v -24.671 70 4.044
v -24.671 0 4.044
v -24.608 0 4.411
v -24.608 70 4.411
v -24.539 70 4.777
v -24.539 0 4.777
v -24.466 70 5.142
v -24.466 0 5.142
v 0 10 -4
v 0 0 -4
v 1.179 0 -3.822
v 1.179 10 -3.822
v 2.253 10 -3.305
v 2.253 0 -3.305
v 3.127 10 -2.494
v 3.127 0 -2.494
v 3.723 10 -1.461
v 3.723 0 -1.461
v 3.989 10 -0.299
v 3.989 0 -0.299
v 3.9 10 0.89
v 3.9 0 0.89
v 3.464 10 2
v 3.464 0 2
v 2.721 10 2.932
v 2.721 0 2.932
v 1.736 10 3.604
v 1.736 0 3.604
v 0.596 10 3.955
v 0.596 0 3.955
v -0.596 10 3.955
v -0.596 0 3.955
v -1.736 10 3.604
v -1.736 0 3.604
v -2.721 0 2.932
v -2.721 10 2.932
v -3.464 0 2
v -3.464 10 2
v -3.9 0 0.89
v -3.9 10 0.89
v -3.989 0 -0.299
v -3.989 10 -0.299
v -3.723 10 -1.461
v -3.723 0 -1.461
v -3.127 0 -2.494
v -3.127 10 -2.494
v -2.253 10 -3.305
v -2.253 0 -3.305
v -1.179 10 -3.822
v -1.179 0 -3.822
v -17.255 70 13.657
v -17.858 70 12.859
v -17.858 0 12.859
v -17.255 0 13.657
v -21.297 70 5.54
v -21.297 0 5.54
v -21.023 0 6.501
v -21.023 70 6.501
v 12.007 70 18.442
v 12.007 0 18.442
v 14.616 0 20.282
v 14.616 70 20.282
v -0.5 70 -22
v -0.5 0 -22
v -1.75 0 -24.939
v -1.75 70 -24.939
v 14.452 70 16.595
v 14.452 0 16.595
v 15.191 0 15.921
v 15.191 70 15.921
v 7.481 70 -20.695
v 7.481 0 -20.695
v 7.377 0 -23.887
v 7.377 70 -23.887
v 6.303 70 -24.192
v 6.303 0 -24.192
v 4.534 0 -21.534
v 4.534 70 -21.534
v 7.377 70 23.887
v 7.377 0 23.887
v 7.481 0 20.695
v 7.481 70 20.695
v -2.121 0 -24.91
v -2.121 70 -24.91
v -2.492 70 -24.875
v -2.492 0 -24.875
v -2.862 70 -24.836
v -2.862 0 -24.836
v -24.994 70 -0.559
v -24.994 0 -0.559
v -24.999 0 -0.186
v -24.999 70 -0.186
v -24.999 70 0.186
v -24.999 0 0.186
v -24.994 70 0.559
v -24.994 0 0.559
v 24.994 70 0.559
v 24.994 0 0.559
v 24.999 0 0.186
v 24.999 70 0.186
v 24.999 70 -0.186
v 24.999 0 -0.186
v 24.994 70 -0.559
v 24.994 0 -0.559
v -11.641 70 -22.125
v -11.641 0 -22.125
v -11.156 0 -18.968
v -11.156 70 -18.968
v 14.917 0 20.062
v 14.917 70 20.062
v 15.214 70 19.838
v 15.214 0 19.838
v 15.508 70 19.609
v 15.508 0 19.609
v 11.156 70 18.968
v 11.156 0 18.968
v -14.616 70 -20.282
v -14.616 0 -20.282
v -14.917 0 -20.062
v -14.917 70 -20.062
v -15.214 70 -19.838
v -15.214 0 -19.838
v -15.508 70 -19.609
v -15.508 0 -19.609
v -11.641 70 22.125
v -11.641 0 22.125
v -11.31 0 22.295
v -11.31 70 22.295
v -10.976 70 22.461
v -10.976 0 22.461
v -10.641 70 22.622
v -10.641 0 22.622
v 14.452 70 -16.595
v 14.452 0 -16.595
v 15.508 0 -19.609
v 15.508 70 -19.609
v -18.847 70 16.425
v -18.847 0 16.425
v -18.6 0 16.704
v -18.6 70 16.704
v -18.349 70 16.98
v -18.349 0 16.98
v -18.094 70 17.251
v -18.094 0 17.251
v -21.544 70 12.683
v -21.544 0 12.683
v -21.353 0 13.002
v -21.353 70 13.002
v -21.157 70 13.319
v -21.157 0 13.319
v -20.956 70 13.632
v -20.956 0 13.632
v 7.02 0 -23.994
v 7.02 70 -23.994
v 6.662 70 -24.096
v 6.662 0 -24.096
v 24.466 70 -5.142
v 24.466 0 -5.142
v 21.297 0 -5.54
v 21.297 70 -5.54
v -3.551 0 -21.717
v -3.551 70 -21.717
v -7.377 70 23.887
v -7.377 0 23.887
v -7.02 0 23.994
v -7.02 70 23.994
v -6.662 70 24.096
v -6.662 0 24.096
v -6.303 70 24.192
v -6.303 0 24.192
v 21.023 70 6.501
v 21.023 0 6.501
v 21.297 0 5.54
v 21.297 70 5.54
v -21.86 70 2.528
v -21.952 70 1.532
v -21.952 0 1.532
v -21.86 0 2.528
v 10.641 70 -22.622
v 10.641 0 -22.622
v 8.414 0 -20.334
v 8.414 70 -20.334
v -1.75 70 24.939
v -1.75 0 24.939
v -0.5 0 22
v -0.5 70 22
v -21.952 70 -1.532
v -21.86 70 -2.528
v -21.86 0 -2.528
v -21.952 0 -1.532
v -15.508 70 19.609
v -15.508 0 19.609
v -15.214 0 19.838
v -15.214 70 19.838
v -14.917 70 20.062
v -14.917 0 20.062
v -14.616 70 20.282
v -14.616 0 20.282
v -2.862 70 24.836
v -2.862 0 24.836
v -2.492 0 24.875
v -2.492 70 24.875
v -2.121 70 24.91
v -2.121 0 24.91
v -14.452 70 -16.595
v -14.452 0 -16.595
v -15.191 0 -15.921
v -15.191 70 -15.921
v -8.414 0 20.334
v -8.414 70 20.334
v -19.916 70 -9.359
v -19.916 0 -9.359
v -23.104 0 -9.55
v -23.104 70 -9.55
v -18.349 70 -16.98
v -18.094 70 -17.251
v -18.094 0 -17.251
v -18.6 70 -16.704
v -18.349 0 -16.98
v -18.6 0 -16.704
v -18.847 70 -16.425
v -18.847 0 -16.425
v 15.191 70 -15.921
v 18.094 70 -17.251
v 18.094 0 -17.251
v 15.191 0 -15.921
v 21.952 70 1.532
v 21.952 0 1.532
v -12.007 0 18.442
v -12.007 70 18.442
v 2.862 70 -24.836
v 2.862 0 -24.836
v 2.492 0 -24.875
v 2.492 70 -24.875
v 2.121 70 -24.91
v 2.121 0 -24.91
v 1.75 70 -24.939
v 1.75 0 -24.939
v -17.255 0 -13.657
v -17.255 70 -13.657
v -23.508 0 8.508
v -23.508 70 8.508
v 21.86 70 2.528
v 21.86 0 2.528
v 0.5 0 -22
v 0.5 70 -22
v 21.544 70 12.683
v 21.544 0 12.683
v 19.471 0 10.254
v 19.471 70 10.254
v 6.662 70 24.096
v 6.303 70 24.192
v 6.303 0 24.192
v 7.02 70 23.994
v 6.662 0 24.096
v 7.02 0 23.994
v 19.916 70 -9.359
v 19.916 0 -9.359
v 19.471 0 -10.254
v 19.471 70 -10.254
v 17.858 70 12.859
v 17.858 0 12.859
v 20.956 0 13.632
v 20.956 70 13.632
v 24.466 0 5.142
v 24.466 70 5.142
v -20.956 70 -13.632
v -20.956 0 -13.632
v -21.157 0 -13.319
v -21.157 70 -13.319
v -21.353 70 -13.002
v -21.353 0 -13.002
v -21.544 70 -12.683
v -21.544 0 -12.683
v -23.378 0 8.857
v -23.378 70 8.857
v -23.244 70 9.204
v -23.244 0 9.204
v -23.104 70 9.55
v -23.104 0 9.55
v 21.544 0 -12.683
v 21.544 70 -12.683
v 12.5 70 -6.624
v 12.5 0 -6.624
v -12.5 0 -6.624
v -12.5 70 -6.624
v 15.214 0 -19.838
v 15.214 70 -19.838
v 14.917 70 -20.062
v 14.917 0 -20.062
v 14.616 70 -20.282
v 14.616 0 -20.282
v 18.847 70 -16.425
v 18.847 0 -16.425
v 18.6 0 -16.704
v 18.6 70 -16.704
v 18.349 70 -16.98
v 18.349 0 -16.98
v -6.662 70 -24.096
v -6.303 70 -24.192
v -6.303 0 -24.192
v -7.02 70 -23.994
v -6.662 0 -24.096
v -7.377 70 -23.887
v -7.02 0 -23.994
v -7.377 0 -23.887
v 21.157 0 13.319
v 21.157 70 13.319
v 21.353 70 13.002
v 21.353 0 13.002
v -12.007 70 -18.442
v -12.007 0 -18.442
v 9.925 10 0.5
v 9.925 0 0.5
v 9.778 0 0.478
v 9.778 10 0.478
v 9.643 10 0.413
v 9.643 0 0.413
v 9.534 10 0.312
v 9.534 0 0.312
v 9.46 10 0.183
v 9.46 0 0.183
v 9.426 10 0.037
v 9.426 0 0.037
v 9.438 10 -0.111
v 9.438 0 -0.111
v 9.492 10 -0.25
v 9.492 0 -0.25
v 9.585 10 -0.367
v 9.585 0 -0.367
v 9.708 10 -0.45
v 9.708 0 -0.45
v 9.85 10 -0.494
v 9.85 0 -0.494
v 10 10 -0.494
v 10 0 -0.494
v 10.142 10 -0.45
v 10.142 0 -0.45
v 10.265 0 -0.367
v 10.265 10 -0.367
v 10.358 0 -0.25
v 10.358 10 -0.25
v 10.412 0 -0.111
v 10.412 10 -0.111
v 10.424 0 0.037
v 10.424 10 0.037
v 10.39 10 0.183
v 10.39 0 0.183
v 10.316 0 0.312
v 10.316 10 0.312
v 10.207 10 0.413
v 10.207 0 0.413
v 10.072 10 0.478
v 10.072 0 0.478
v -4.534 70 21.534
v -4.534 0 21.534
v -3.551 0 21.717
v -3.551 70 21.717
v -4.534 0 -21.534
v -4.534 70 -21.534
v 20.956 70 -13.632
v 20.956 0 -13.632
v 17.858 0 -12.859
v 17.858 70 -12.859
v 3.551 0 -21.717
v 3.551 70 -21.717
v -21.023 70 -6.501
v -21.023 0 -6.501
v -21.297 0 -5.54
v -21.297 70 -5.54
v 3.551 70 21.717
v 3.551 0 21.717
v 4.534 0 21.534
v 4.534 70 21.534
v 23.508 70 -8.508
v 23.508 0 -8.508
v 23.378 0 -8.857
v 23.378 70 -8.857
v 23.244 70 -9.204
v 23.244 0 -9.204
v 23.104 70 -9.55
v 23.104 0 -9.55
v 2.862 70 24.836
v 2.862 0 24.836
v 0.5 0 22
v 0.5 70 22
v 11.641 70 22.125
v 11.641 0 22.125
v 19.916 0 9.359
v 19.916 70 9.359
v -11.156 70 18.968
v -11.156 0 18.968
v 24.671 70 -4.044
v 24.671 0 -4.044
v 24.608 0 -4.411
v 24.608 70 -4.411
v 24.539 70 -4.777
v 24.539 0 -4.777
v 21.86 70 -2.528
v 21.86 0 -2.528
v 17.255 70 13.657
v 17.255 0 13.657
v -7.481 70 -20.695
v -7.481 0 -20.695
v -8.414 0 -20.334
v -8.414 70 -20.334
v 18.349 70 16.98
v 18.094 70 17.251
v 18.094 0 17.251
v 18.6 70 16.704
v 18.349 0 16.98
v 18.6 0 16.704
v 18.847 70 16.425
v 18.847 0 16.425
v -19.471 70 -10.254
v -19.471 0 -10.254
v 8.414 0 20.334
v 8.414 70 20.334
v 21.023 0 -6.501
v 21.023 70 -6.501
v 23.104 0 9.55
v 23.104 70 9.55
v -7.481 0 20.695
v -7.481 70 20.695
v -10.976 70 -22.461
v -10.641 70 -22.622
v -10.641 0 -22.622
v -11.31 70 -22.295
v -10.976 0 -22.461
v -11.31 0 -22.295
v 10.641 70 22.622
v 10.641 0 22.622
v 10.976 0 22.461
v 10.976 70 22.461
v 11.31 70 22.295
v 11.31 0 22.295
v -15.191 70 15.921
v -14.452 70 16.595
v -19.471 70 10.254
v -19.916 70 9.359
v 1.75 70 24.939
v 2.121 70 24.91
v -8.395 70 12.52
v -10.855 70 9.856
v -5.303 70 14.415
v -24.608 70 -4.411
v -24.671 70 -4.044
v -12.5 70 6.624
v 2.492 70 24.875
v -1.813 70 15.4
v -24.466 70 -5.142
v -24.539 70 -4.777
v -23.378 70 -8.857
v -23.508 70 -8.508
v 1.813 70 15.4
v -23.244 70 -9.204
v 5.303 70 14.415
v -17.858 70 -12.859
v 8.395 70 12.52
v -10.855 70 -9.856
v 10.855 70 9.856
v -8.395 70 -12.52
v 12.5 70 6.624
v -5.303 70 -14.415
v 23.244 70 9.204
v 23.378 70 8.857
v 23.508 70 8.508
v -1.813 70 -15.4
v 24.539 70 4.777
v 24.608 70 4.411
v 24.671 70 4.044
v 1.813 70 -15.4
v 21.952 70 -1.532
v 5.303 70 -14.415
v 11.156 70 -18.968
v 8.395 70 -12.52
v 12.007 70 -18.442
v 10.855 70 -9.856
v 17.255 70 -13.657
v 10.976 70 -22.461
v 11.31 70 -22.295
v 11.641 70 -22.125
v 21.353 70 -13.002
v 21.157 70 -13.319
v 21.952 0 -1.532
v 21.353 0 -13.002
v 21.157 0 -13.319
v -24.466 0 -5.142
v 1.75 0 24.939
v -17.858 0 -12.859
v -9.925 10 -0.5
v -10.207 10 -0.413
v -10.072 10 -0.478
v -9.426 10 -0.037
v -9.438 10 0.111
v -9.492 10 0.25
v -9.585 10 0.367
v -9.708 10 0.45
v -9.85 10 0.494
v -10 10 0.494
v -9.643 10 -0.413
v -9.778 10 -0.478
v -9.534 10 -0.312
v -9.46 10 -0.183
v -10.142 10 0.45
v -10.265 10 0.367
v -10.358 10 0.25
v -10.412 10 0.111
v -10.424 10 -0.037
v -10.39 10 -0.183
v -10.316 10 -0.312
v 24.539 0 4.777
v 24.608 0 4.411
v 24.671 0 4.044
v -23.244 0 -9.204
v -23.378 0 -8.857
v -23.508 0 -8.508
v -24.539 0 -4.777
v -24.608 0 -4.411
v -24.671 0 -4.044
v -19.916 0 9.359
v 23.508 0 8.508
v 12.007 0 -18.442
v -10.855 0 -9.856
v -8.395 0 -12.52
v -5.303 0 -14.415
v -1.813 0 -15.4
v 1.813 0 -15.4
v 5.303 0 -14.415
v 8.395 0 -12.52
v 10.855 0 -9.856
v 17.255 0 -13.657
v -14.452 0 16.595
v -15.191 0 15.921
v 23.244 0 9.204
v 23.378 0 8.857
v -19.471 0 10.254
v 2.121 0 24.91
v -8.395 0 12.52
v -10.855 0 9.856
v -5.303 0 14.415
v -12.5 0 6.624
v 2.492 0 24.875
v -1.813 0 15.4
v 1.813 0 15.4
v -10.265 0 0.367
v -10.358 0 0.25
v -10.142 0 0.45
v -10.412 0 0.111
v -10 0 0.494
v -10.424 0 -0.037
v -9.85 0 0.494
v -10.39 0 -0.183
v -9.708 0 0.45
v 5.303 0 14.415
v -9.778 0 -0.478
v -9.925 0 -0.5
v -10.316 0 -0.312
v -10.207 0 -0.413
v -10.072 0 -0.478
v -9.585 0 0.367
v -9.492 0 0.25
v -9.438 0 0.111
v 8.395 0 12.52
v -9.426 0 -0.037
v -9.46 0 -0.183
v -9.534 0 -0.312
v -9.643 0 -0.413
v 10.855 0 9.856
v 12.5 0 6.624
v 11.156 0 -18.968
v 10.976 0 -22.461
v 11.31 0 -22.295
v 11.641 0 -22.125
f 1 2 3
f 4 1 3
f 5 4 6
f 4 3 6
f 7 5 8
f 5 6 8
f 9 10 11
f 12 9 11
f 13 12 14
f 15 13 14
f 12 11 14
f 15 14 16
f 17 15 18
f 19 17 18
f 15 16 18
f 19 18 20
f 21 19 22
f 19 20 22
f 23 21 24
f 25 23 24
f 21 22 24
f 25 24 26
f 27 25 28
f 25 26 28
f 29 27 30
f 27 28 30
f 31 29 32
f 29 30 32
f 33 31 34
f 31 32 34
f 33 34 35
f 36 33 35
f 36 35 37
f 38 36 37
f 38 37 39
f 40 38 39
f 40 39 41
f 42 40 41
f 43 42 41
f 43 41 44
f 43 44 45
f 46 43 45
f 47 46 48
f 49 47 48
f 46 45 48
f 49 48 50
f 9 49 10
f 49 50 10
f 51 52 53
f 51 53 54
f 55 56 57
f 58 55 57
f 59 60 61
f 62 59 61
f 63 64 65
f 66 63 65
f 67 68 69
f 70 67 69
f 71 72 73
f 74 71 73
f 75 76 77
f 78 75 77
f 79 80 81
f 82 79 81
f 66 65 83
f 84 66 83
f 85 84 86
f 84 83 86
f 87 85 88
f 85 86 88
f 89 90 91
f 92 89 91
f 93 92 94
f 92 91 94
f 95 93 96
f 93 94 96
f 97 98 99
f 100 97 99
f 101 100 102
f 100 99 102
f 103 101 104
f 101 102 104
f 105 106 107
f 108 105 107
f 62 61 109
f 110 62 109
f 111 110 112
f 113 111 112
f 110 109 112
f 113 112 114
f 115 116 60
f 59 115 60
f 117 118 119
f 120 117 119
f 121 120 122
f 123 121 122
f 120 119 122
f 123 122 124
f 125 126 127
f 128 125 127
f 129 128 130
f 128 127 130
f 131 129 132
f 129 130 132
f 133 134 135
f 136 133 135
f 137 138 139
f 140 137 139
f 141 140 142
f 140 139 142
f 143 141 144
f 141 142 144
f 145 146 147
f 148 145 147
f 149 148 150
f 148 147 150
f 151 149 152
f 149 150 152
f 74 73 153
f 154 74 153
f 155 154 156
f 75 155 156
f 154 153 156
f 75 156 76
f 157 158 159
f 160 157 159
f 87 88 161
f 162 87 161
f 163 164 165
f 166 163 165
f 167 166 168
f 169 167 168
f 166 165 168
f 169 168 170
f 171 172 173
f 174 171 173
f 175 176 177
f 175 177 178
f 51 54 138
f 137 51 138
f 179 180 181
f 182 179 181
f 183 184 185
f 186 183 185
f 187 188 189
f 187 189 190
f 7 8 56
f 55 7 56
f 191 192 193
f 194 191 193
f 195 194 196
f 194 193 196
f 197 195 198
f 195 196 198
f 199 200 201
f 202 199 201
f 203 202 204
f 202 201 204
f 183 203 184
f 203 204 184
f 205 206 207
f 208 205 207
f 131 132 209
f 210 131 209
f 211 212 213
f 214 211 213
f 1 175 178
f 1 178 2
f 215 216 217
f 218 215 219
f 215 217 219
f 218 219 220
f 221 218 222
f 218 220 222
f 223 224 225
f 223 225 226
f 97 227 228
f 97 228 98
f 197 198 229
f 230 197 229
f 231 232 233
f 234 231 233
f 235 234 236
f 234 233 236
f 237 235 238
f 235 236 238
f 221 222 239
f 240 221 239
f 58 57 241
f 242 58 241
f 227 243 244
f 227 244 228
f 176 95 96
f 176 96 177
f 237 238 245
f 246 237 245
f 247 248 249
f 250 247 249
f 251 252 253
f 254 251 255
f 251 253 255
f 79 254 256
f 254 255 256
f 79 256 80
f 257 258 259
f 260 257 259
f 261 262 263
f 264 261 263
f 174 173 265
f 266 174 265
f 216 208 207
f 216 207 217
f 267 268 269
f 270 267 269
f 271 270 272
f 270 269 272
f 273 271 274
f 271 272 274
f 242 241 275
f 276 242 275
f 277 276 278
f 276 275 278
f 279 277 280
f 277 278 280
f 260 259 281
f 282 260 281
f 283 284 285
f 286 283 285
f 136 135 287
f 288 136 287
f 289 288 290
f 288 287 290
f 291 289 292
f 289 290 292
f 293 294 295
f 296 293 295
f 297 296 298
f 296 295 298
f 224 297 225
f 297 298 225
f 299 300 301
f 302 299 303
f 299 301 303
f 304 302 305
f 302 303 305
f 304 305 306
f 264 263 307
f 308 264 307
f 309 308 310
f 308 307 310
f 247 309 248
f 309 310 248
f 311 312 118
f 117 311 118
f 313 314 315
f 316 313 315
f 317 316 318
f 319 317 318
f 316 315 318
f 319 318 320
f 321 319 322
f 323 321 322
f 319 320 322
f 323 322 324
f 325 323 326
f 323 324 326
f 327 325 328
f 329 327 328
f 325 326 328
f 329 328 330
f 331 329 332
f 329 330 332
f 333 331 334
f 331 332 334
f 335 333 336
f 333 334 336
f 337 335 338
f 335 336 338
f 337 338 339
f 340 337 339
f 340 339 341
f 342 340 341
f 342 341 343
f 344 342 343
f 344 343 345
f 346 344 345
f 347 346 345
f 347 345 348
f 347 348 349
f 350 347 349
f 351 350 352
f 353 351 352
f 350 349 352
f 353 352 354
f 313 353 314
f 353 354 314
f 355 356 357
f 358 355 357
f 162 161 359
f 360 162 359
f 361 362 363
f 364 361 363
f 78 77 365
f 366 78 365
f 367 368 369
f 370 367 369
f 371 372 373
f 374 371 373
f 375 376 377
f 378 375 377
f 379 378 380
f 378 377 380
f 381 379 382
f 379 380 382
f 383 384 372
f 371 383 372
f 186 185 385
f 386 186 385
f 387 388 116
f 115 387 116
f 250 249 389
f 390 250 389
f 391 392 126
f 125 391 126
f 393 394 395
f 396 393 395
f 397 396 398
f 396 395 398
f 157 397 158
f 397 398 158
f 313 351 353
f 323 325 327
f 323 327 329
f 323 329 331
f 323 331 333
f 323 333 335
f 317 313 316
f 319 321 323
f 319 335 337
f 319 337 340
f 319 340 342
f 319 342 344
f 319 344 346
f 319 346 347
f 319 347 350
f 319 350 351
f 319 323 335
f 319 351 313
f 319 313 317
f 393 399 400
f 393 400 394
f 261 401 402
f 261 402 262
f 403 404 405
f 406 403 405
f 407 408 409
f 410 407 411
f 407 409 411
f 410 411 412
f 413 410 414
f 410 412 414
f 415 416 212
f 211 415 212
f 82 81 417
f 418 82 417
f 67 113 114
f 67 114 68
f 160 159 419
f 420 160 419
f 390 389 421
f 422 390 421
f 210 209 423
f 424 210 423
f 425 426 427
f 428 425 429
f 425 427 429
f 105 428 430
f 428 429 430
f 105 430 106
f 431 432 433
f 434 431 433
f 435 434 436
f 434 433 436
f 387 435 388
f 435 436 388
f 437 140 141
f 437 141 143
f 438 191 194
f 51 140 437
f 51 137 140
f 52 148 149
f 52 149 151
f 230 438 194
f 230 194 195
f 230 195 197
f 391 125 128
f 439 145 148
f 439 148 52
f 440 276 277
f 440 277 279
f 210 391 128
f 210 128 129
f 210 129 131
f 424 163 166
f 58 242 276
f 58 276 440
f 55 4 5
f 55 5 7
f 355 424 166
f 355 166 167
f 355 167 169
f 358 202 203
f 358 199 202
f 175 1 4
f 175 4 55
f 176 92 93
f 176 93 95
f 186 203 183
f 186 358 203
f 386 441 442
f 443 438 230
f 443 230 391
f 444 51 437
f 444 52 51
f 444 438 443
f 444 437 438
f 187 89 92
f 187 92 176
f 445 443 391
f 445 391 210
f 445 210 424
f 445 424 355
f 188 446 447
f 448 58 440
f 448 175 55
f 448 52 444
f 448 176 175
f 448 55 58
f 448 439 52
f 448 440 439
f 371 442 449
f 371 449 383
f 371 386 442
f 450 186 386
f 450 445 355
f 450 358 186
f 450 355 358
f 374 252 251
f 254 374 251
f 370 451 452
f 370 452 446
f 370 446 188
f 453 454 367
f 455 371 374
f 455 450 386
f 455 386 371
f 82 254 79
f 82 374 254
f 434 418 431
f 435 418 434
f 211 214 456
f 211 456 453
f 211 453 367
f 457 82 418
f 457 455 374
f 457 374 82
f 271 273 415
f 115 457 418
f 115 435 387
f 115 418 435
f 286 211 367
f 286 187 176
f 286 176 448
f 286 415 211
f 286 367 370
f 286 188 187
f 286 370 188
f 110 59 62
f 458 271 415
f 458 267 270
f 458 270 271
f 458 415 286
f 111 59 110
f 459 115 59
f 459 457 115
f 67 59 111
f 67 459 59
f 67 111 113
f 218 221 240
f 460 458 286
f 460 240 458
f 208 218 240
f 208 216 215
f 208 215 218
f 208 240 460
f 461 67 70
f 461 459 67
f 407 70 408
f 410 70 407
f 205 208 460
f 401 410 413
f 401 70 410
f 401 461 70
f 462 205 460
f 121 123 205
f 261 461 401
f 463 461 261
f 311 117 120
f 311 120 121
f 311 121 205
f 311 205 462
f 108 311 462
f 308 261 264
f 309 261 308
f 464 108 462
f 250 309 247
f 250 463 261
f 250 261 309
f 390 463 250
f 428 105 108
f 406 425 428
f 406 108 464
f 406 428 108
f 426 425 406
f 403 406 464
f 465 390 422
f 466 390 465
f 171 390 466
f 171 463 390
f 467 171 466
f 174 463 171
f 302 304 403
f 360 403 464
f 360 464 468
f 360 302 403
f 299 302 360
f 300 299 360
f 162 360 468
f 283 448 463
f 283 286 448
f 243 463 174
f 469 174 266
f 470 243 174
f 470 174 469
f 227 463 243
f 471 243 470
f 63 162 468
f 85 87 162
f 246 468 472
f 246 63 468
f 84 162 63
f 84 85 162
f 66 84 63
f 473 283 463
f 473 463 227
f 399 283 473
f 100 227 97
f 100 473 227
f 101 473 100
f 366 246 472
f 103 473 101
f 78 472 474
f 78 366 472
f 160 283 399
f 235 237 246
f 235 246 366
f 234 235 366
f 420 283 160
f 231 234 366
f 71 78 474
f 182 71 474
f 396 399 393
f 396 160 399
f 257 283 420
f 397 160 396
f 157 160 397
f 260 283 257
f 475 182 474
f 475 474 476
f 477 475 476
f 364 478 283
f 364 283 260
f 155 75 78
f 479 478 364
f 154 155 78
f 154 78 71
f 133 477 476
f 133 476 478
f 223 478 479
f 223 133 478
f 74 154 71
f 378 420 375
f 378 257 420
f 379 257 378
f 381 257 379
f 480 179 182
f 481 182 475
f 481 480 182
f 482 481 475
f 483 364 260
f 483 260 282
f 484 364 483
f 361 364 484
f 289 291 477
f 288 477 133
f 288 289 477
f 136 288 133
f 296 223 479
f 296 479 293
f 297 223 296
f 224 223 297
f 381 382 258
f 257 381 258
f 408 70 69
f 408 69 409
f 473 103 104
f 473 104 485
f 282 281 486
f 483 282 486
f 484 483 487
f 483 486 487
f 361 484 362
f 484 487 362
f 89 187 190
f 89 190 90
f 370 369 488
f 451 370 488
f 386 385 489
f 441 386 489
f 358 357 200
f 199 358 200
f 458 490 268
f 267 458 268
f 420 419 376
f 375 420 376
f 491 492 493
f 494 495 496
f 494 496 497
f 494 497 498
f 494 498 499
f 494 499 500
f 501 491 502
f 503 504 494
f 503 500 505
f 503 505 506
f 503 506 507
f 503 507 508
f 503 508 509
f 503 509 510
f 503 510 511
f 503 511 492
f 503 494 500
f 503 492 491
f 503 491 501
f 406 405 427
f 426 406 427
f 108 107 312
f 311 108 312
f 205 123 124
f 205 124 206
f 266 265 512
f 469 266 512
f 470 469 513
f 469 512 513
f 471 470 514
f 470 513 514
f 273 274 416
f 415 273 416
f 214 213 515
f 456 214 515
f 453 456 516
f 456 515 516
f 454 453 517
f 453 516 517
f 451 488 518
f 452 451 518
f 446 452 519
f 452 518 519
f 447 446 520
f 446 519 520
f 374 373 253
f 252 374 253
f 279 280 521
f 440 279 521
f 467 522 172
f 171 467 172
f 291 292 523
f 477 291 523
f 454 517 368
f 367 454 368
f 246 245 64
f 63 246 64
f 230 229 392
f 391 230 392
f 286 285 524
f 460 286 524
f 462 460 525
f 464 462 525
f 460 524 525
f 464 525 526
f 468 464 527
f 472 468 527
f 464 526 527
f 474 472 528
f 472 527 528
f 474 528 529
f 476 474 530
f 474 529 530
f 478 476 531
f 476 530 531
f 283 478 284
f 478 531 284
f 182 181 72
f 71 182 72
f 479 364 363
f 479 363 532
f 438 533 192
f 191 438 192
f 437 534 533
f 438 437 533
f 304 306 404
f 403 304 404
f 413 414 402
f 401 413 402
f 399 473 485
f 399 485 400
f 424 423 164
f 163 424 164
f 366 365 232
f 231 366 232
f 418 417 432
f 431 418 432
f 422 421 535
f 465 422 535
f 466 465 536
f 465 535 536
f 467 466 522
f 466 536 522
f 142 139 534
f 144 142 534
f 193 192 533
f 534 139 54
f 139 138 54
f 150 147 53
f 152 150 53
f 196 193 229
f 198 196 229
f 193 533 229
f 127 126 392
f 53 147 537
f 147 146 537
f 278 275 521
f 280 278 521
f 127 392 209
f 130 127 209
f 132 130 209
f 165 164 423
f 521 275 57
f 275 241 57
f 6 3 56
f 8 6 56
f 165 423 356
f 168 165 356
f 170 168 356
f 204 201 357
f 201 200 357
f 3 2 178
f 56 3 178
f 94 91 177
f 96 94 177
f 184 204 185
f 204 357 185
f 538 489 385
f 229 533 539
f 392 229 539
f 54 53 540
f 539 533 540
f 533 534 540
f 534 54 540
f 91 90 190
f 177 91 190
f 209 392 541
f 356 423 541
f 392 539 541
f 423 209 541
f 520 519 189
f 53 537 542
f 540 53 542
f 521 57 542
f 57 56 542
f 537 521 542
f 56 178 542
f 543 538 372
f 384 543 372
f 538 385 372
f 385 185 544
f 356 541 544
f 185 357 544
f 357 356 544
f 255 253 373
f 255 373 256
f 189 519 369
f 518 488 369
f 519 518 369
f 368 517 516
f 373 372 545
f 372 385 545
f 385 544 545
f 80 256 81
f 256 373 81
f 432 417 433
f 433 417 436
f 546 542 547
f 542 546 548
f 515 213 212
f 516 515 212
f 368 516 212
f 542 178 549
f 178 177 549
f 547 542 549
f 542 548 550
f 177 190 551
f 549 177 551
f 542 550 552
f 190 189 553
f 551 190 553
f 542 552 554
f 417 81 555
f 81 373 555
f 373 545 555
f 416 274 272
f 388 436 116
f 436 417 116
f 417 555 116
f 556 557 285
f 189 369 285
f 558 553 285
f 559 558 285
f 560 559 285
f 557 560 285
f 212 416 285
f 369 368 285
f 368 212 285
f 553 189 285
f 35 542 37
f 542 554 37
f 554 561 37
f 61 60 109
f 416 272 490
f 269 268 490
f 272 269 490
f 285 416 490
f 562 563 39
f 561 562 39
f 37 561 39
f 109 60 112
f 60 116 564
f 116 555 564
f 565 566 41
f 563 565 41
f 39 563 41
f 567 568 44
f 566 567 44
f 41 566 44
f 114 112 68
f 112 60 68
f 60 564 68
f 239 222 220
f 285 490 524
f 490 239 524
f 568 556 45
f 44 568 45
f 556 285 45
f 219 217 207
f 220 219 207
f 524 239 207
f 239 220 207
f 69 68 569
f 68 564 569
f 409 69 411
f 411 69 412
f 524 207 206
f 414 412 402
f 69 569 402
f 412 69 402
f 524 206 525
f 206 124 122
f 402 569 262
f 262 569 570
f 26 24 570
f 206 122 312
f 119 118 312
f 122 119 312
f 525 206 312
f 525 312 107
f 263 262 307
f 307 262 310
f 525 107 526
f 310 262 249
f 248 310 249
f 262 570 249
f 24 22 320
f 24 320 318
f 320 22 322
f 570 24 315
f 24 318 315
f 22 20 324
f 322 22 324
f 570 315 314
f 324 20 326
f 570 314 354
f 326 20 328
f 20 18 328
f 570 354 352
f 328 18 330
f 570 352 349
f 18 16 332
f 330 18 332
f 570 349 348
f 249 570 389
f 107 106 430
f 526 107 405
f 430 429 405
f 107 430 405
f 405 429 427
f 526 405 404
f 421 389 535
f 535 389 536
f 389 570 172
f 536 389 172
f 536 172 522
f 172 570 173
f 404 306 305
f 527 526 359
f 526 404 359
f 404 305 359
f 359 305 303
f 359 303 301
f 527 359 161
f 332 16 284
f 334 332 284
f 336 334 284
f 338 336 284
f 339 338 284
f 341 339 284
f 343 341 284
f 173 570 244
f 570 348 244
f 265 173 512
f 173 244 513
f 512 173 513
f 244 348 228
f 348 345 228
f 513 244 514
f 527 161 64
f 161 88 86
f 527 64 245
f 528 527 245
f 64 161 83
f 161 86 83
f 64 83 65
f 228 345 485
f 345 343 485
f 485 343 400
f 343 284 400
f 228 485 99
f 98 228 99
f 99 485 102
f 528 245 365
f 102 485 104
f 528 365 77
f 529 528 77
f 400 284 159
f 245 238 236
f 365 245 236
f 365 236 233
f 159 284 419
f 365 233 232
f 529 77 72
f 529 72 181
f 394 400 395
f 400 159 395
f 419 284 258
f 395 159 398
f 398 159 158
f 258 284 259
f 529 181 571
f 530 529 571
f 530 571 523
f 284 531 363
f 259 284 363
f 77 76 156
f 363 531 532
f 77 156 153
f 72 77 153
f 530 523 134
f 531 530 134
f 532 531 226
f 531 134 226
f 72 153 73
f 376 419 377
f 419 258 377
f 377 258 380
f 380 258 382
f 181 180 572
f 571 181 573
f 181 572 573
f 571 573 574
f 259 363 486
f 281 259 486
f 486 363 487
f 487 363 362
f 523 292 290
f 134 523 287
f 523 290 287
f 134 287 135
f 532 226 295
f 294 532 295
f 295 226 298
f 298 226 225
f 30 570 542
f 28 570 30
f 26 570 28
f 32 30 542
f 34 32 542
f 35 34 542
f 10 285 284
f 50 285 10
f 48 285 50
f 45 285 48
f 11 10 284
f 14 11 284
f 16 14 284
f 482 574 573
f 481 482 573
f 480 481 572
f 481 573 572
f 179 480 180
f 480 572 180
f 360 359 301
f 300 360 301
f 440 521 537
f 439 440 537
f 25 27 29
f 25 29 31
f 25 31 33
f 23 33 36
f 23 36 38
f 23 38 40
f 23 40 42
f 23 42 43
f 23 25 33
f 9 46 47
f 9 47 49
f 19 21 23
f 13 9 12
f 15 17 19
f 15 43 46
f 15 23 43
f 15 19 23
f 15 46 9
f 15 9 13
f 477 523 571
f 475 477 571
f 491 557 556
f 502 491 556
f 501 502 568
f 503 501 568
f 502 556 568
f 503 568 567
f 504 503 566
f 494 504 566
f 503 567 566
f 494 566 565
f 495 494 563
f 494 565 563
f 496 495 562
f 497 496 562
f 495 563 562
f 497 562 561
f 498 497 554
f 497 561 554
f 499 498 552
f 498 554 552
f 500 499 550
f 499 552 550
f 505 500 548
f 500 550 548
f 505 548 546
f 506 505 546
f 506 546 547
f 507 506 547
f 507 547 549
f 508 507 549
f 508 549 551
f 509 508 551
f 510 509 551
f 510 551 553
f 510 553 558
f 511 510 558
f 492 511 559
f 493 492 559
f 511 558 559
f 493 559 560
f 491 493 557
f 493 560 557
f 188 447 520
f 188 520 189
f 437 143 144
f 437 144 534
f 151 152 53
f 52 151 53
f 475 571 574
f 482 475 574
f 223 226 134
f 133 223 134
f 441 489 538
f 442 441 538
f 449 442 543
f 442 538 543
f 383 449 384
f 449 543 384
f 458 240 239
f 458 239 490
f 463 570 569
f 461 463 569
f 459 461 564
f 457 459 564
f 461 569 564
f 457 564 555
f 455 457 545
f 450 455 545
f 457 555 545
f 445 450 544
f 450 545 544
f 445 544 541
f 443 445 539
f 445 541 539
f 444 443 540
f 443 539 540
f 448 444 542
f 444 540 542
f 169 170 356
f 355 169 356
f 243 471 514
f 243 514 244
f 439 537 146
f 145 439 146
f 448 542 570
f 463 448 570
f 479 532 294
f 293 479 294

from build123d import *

# Parameters (mm, degrees)
BOSS_EXTRUDE2_DEPTH = 70
SKETCH3_R           = 4
CUT_EXTRUDE1_DEPTH  = 10
SKETCH4_R           = 0.5
CUT_EXTRUDE2_DEPTH  = 10
CIRPATTERN1_COUNT   = 2
CUT_EXTRUDE3_DEPTH  = 79.402407488


# Read off the part's stored shape, not the designer's step: Boss-Extrude2
with BuildPart() as part:
    # Boss-Extrude2 outline → Boss-Extrude2 (new body)
    with BuildSketch(Plane(origin=(0, 0, 0), x_dir=(1, 0, 0), z_dir=(0, 1, 0))):
        with BuildLine():
            Line((1.75, 24.938674784), (0.5, 22))
            Line((0.5, 22), (-0.5, 22))
            Line((-0.5, 22), (-1.75, 24.938674784))
            ThreePointArc((-1.75, 24.938674784), (-2.306708986, 24.893354407), (-2.862266542, 24.835608111))
            Line((-2.862266542, 24.835608111), (-3.551002842, 21.717282952))
            Line((-3.551002842, 21.717282952), (-4.533975942, 21.533533434))
            Line((-4.533975942, 21.533533434), (-6.302672391, 24.192484799))
            ThreePointArc((-6.302672391, 24.192484799), (-6.841574752, 24.045641079), (-7.37706203, 23.88679459))
            Line((-7.37706203, 23.88679459), (-7.481080541, 20.69500988))
            Line((-7.481080541, 20.69500988), (-8.413552771, 20.333768214))
            Line((-8.413552771, 20.333768214), (-10.640714833, 22.622448759))
            ThreePointArc((-10.640714833, 22.622448759), (-11.143458894, 22.379082284), (-11.640640518, 22.124544929))
            Line((-11.640640518, 22.124544929), (-11.156399015, 18.967993067))
            Line((-11.156399015, 18.967993067), (-12.006616151, 18.441560905))
            Line((-12.006616151, 18.441560905), (-14.616400494, 20.282032359))
            ThreePointArc((-14.616400494, 20.282032359), (-15.065865909, 19.950430682), (-15.507810955, 19.608870426))
            Line((-15.507810955, 19.608870426), (-14.451799702, 16.595044001))
            Line((-14.451799702, 16.595044001), (-15.190808619, 15.921348357))
            Line((-15.190808619, 15.921348357), (-18.094342166, 17.250935673))
            ThreePointArc((-18.094342166, 17.250935673), (-18.475222931, 16.842391091), (-18.84688149, 16.425439358))
            Line((-18.84688149, 16.425439358), (-17.255061682, 13.656970614))
            Line((-17.255061682, 13.656970614), (-17.857696318, 12.858953387))
            Line((-17.857696318, 12.858953387), (-20.956102717, 13.632379063))
            ThreePointArc((-20.956102717, 13.632379063), (-21.255428393, 13.160804072), (-21.544144079, 12.682659653))
            Line((-21.544144079, 12.682659653), (-19.470723232, 10.253825473))
            Line((-19.470723232, 10.253825473), (-19.916461588, 9.358662181))
            Line((-19.916461588, 9.358662181), (-23.104228325, 9.549588134))
            ThreePointArc((-23.104228325, 9.549588134), (-23.311805735, 9.031041654), (-23.507746682, 8.507987185))
            Line((-23.507746682, 8.507987185), (-21.023332655, 6.501498603))
            Line((-21.023332655, 6.501498603), (-21.296995645, 5.53967296))
            Line((-21.296995645, 5.53967296), (-24.465567147, 5.141597434))
            ThreePointArc((-24.465567147, 5.141597434), (-24.574327492, 4.593737945), (-24.670821165, 4.043585418))
            Line((-24.670821165, 4.043585418), (-21.860017699, 2.527770996))
            Line((-21.860017699, 2.527770996), (-21.952286058, 1.53203682))
            Line((-21.952286058, 1.53203682), (-24.993760423, 0.558515801))
            ThreePointArc((-24.993760423, 0.558515801), (-25, 0), (-24.993760423, -0.558515801))
            Line((-24.993760423, -0.558515801), (-21.952286058, -1.53203682))
            Line((-21.952286058, -1.53203682), (-21.860017699, -2.527770996))
            Line((-21.860017699, -2.527770996), (-24.670821165, -4.043585418))
            ThreePointArc((-24.670821165, -4.043585418), (-24.574327492, -4.593737945), (-24.465567147, -5.141597434))
            Line((-24.465567147, -5.141597434), (-21.296995645, -5.53967296))
            Line((-21.296995645, -5.53967296), (-21.023332655, -6.501498603))
            Line((-21.023332655, -6.501498603), (-23.507746682, -8.507987185))
            ThreePointArc((-23.507746682, -8.507987185), (-23.311805735, -9.031041654), (-23.104228325, -9.549588134))
            Line((-23.104228325, -9.549588134), (-19.916461588, -9.358662181))
            Line((-19.916461588, -9.358662181), (-19.470723232, -10.253825473))
            Line((-19.470723232, -10.253825473), (-21.544144079, -12.682659654))
            ThreePointArc((-21.544144079, -12.682659654), (-21.255428393, -13.160804072), (-20.956102717, -13.632379063))
            Line((-20.956102717, -13.632379063), (-17.857696318, -12.858953387))
            Line((-17.857696318, -12.858953387), (-17.255061682, -13.656970614))
            Line((-17.255061682, -13.656970614), (-18.84688149, -16.425439358))
            ThreePointArc((-18.84688149, -16.425439358), (-18.475222931, -16.842391091), (-18.094342166, -17.250935673))
            Line((-18.094342166, -17.250935673), (-15.190808619, -15.921348357))
            Line((-15.190808619, -15.921348357), (-14.451799702, -16.595044001))
            Line((-14.451799702, -16.595044001), (-15.507810955, -19.608870426))
            ThreePointArc((-15.507810955, -19.608870426), (-15.065865909, -19.950430682), (-14.616400494, -20.282032359))
            Line((-14.616400494, -20.282032359), (-12.006616151, -18.441560905))
            Line((-12.006616151, -18.441560905), (-11.156399015, -18.967993067))
            Line((-11.156399015, -18.967993067), (-11.640640518, -22.124544929))
            ThreePointArc((-11.640640518, -22.124544929), (-11.143458894, -22.379082284), (-10.640714833, -22.622448759))
            Line((-10.640714833, -22.622448759), (-8.413552771, -20.333768214))
            Line((-8.413552771, -20.333768214), (-7.481080541, -20.69500988))
            Line((-7.481080541, -20.69500988), (-7.37706203, -23.88679459))
            ThreePointArc((-7.37706203, -23.88679459), (-6.841574752, -24.045641079), (-6.302672391, -24.192484799))
            Line((-6.302672391, -24.192484799), (-4.533975942, -21.533533434))
            Line((-4.533975942, -21.533533434), (-3.551002842, -21.717282952))
            Line((-3.551002842, -21.717282952), (-2.862266542, -24.835608111))
            ThreePointArc((-2.862266542, -24.835608111), (-2.306708986, -24.893354407), (-1.75, -24.938674784))
            Line((-1.75, -24.938674784), (-0.5, -22))
            Line((-0.5, -22), (0.5, -22))
            Line((0.5, -22), (1.75, -24.938674784))
            ThreePointArc((1.75, -24.938674784), (2.306708986, -24.893354407), (2.862266542, -24.835608111))
            Line((2.862266542, -24.835608111), (3.551002842, -21.717282952))
            Line((3.551002842, -21.717282952), (4.533975942, -21.533533434))
            Line((4.533975942, -21.533533434), (6.302672391, -24.192484799))
            ThreePointArc((6.302672391, -24.192484799), (6.841574752, -24.045641079), (7.37706203, -23.88679459))
            Line((7.37706203, -23.88679459), (7.481080541, -20.69500988))
            Line((7.481080541, -20.69500988), (8.413552771, -20.333768214))
            Line((8.413552771, -20.333768214), (10.640714833, -22.622448759))
            ThreePointArc((10.640714833, -22.622448759), (11.143458895, -22.379082284), (11.640640519, -22.124544929))
            Line((11.640640519, -22.124544929), (11.156399015, -18.967993067))
            Line((11.156399015, -18.967993067), (12.006616151, -18.441560905))
            Line((12.006616151, -18.441560905), (14.616400494, -20.282032359))
            ThreePointArc((14.616400494, -20.282032359), (15.065865909, -19.950430682), (15.507810955, -19.608870426))
            Line((15.507810955, -19.608870426), (14.451799702, -16.595044001))
            Line((14.451799702, -16.595044001), (15.190808619, -15.921348357))
            Line((15.190808619, -15.921348357), (18.094342166, -17.250935673))
            ThreePointArc((18.094342166, -17.250935673), (18.475222931, -16.842391091), (18.84688149, -16.425439358))
            Line((18.84688149, -16.425439358), (17.255061682, -13.656970614))
            Line((17.255061682, -13.656970614), (17.857696318, -12.858953387))
            Line((17.857696318, -12.858953387), (20.956102717, -13.632379063))
            ThreePointArc((20.956102717, -13.632379063), (21.255428393, -13.160804072), (21.544144079, -12.682659653))
            Line((21.544144079, -12.682659653), (19.470723232, -10.253825473))
            Line((19.470723232, -10.253825473), (19.916461588, -9.358662181))
            Line((19.916461588, -9.358662181), (23.104228325, -9.549588134))
            ThreePointArc((23.104228325, -9.549588134), (23.311805735, -9.031041654), (23.507746682, -8.507987185))
            Line((23.507746682, -8.507987185), (21.023332655, -6.501498603))
            Line((21.023332655, -6.501498603), (21.296995645, -5.53967296))
            Line((21.296995645, -5.53967296), (24.465567147, -5.141597434))
            ThreePointArc((24.465567147, -5.141597434), (24.574327492, -4.593737945), (24.670821165, -4.043585418))
            Line((24.670821165, -4.043585418), (21.860017699, -2.527770996))
            Line((21.860017699, -2.527770996), (21.952286058, -1.53203682))
            Line((21.952286058, -1.53203682), (24.993760423, -0.558515801))
            ThreePointArc((24.993760423, -0.558515801), (25, 0), (24.993760423, 0.558515801))
            Line((24.993760423, 0.558515801), (21.952286058, 1.53203682))
            Line((21.952286058, 1.53203682), (21.860017699, 2.527770996))
            Line((21.860017699, 2.527770996), (24.670821165, 4.043585418))
            ThreePointArc((24.670821165, 4.043585418), (24.574327492, 4.593737945), (24.465567147, 5.141597434))
            Line((24.465567147, 5.141597434), (21.296995645, 5.53967296))
            Line((21.296995645, 5.53967296), (21.023332655, 6.501498603))
            Line((21.023332655, 6.501498603), (23.507746682, 8.507987185))
            ThreePointArc((23.507746682, 8.507987185), (23.311805735, 9.031041654), (23.104228325, 9.549588134))
            Line((23.104228325, 9.549588134), (19.916461588, 9.358662181))
            Line((19.916461588, 9.358662181), (19.470723232, 10.253825473))
            Line((19.470723232, 10.253825473), (21.544144079, 12.682659653))
            ThreePointArc((21.544144079, 12.682659653), (21.255428393, 13.160804072), (20.956102717, 13.632379063))
            Line((20.956102717, 13.632379063), (17.857696318, 12.858953387))
            Line((17.857696318, 12.858953387), (17.255061682, 13.656970614))
            Line((17.255061682, 13.656970614), (18.84688149, 16.425439358))
            ThreePointArc((18.84688149, 16.425439358), (18.475222931, 16.842391091), (18.094342166, 17.250935673))
            Line((18.094342166, 17.250935673), (15.190808619, 15.921348357))
            Line((15.190808619, 15.921348357), (14.451799702, 16.595044001))
            Line((14.451799702, 16.595044001), (15.507810955, 19.608870426))
            ThreePointArc((15.507810955, 19.608870426), (15.065865909, 19.950430682), (14.616400494, 20.282032359))
            Line((14.616400494, 20.282032359), (12.006616151, 18.441560905))
            Line((12.006616151, 18.441560905), (11.156399015, 18.967993067))
            Line((11.156399015, 18.967993067), (11.640640518, 22.124544929))
            ThreePointArc((11.640640518, 22.124544929), (11.143458894, 22.379082284), (10.640714833, 22.622448759))
            Line((10.640714833, 22.622448759), (8.413552771, 20.333768214))
            Line((8.413552771, 20.333768214), (7.481080541, 20.69500988))
            Line((7.481080541, 20.69500988), (7.37706203, 23.88679459))
            ThreePointArc((7.37706203, 23.88679459), (6.841574752, 24.045641079), (6.302672391, 24.192484799))
            Line((6.302672391, 24.192484799), (4.533975942, 21.533533434))
            Line((4.533975942, 21.533533434), (3.551002842, 21.717282952))
            Line((3.551002842, 21.717282952), (2.862266542, 24.835608111))
            ThreePointArc((2.862266542, 24.835608111), (2.306708986, 24.893354407), (1.75, 24.938674784))
        make_face()
    extrude(amount=BOSS_EXTRUDE2_DEPTH)

    # Sketch3 → Cut-Extrude1 (cut)
    with BuildSketch(Plane.XZ):
        with Locations(Location((0, 0, 0), (0, 0, 270))):
            Circle(SKETCH3_R)
    extrude(amount=-CUT_EXTRUDE1_DEPTH, mode=Mode.SUBTRACT)

    # Sketch4 → Cut-Extrude2 (cut)
    with BuildSketch(Plane.XZ):
        with Locations(Location((-9.925, 0, 0), (0, 0, 270))):
            Circle(SKETCH4_R)
    cut_extrude2 = extrude(amount=-CUT_EXTRUDE2_DEPTH, mode=Mode.SUBTRACT)

    # CirPattern1: Cut-Extrude2 ×2 about axis
    cirpattern1_axis = Axis((0, 0, 0), (0, 1, 0))
    for i in range(1, CIRPATTERN1_COUNT):
        add(cut_extrude2.rotate(cirpattern1_axis, i * 360 / CIRPATTERN1_COUNT), mode=Mode.SUBTRACT)

    # Sketch5 → Cut-Extrude3 (cut, through all)
    with BuildSketch(Plane.XZ):
        with BuildLine():
            Line((-12.5, 6.623664739), (12.5, 6.623664739))
            ThreePointArc((12.5, 6.623664739), (0, 15.524722913), (-12.5, 6.623664739))
        make_face()
        with BuildLine():
            Line((12.5, -6.623664739), (-12.5, -6.623664739))
            ThreePointArc((-12.5, -6.623664739), (0, -15.524722913), (12.5, -6.623664739))
        make_face()
    extrude(amount=-CUT_EXTRUDE3_DEPTH, mode=Mode.SUBTRACT)


solid = part.part
